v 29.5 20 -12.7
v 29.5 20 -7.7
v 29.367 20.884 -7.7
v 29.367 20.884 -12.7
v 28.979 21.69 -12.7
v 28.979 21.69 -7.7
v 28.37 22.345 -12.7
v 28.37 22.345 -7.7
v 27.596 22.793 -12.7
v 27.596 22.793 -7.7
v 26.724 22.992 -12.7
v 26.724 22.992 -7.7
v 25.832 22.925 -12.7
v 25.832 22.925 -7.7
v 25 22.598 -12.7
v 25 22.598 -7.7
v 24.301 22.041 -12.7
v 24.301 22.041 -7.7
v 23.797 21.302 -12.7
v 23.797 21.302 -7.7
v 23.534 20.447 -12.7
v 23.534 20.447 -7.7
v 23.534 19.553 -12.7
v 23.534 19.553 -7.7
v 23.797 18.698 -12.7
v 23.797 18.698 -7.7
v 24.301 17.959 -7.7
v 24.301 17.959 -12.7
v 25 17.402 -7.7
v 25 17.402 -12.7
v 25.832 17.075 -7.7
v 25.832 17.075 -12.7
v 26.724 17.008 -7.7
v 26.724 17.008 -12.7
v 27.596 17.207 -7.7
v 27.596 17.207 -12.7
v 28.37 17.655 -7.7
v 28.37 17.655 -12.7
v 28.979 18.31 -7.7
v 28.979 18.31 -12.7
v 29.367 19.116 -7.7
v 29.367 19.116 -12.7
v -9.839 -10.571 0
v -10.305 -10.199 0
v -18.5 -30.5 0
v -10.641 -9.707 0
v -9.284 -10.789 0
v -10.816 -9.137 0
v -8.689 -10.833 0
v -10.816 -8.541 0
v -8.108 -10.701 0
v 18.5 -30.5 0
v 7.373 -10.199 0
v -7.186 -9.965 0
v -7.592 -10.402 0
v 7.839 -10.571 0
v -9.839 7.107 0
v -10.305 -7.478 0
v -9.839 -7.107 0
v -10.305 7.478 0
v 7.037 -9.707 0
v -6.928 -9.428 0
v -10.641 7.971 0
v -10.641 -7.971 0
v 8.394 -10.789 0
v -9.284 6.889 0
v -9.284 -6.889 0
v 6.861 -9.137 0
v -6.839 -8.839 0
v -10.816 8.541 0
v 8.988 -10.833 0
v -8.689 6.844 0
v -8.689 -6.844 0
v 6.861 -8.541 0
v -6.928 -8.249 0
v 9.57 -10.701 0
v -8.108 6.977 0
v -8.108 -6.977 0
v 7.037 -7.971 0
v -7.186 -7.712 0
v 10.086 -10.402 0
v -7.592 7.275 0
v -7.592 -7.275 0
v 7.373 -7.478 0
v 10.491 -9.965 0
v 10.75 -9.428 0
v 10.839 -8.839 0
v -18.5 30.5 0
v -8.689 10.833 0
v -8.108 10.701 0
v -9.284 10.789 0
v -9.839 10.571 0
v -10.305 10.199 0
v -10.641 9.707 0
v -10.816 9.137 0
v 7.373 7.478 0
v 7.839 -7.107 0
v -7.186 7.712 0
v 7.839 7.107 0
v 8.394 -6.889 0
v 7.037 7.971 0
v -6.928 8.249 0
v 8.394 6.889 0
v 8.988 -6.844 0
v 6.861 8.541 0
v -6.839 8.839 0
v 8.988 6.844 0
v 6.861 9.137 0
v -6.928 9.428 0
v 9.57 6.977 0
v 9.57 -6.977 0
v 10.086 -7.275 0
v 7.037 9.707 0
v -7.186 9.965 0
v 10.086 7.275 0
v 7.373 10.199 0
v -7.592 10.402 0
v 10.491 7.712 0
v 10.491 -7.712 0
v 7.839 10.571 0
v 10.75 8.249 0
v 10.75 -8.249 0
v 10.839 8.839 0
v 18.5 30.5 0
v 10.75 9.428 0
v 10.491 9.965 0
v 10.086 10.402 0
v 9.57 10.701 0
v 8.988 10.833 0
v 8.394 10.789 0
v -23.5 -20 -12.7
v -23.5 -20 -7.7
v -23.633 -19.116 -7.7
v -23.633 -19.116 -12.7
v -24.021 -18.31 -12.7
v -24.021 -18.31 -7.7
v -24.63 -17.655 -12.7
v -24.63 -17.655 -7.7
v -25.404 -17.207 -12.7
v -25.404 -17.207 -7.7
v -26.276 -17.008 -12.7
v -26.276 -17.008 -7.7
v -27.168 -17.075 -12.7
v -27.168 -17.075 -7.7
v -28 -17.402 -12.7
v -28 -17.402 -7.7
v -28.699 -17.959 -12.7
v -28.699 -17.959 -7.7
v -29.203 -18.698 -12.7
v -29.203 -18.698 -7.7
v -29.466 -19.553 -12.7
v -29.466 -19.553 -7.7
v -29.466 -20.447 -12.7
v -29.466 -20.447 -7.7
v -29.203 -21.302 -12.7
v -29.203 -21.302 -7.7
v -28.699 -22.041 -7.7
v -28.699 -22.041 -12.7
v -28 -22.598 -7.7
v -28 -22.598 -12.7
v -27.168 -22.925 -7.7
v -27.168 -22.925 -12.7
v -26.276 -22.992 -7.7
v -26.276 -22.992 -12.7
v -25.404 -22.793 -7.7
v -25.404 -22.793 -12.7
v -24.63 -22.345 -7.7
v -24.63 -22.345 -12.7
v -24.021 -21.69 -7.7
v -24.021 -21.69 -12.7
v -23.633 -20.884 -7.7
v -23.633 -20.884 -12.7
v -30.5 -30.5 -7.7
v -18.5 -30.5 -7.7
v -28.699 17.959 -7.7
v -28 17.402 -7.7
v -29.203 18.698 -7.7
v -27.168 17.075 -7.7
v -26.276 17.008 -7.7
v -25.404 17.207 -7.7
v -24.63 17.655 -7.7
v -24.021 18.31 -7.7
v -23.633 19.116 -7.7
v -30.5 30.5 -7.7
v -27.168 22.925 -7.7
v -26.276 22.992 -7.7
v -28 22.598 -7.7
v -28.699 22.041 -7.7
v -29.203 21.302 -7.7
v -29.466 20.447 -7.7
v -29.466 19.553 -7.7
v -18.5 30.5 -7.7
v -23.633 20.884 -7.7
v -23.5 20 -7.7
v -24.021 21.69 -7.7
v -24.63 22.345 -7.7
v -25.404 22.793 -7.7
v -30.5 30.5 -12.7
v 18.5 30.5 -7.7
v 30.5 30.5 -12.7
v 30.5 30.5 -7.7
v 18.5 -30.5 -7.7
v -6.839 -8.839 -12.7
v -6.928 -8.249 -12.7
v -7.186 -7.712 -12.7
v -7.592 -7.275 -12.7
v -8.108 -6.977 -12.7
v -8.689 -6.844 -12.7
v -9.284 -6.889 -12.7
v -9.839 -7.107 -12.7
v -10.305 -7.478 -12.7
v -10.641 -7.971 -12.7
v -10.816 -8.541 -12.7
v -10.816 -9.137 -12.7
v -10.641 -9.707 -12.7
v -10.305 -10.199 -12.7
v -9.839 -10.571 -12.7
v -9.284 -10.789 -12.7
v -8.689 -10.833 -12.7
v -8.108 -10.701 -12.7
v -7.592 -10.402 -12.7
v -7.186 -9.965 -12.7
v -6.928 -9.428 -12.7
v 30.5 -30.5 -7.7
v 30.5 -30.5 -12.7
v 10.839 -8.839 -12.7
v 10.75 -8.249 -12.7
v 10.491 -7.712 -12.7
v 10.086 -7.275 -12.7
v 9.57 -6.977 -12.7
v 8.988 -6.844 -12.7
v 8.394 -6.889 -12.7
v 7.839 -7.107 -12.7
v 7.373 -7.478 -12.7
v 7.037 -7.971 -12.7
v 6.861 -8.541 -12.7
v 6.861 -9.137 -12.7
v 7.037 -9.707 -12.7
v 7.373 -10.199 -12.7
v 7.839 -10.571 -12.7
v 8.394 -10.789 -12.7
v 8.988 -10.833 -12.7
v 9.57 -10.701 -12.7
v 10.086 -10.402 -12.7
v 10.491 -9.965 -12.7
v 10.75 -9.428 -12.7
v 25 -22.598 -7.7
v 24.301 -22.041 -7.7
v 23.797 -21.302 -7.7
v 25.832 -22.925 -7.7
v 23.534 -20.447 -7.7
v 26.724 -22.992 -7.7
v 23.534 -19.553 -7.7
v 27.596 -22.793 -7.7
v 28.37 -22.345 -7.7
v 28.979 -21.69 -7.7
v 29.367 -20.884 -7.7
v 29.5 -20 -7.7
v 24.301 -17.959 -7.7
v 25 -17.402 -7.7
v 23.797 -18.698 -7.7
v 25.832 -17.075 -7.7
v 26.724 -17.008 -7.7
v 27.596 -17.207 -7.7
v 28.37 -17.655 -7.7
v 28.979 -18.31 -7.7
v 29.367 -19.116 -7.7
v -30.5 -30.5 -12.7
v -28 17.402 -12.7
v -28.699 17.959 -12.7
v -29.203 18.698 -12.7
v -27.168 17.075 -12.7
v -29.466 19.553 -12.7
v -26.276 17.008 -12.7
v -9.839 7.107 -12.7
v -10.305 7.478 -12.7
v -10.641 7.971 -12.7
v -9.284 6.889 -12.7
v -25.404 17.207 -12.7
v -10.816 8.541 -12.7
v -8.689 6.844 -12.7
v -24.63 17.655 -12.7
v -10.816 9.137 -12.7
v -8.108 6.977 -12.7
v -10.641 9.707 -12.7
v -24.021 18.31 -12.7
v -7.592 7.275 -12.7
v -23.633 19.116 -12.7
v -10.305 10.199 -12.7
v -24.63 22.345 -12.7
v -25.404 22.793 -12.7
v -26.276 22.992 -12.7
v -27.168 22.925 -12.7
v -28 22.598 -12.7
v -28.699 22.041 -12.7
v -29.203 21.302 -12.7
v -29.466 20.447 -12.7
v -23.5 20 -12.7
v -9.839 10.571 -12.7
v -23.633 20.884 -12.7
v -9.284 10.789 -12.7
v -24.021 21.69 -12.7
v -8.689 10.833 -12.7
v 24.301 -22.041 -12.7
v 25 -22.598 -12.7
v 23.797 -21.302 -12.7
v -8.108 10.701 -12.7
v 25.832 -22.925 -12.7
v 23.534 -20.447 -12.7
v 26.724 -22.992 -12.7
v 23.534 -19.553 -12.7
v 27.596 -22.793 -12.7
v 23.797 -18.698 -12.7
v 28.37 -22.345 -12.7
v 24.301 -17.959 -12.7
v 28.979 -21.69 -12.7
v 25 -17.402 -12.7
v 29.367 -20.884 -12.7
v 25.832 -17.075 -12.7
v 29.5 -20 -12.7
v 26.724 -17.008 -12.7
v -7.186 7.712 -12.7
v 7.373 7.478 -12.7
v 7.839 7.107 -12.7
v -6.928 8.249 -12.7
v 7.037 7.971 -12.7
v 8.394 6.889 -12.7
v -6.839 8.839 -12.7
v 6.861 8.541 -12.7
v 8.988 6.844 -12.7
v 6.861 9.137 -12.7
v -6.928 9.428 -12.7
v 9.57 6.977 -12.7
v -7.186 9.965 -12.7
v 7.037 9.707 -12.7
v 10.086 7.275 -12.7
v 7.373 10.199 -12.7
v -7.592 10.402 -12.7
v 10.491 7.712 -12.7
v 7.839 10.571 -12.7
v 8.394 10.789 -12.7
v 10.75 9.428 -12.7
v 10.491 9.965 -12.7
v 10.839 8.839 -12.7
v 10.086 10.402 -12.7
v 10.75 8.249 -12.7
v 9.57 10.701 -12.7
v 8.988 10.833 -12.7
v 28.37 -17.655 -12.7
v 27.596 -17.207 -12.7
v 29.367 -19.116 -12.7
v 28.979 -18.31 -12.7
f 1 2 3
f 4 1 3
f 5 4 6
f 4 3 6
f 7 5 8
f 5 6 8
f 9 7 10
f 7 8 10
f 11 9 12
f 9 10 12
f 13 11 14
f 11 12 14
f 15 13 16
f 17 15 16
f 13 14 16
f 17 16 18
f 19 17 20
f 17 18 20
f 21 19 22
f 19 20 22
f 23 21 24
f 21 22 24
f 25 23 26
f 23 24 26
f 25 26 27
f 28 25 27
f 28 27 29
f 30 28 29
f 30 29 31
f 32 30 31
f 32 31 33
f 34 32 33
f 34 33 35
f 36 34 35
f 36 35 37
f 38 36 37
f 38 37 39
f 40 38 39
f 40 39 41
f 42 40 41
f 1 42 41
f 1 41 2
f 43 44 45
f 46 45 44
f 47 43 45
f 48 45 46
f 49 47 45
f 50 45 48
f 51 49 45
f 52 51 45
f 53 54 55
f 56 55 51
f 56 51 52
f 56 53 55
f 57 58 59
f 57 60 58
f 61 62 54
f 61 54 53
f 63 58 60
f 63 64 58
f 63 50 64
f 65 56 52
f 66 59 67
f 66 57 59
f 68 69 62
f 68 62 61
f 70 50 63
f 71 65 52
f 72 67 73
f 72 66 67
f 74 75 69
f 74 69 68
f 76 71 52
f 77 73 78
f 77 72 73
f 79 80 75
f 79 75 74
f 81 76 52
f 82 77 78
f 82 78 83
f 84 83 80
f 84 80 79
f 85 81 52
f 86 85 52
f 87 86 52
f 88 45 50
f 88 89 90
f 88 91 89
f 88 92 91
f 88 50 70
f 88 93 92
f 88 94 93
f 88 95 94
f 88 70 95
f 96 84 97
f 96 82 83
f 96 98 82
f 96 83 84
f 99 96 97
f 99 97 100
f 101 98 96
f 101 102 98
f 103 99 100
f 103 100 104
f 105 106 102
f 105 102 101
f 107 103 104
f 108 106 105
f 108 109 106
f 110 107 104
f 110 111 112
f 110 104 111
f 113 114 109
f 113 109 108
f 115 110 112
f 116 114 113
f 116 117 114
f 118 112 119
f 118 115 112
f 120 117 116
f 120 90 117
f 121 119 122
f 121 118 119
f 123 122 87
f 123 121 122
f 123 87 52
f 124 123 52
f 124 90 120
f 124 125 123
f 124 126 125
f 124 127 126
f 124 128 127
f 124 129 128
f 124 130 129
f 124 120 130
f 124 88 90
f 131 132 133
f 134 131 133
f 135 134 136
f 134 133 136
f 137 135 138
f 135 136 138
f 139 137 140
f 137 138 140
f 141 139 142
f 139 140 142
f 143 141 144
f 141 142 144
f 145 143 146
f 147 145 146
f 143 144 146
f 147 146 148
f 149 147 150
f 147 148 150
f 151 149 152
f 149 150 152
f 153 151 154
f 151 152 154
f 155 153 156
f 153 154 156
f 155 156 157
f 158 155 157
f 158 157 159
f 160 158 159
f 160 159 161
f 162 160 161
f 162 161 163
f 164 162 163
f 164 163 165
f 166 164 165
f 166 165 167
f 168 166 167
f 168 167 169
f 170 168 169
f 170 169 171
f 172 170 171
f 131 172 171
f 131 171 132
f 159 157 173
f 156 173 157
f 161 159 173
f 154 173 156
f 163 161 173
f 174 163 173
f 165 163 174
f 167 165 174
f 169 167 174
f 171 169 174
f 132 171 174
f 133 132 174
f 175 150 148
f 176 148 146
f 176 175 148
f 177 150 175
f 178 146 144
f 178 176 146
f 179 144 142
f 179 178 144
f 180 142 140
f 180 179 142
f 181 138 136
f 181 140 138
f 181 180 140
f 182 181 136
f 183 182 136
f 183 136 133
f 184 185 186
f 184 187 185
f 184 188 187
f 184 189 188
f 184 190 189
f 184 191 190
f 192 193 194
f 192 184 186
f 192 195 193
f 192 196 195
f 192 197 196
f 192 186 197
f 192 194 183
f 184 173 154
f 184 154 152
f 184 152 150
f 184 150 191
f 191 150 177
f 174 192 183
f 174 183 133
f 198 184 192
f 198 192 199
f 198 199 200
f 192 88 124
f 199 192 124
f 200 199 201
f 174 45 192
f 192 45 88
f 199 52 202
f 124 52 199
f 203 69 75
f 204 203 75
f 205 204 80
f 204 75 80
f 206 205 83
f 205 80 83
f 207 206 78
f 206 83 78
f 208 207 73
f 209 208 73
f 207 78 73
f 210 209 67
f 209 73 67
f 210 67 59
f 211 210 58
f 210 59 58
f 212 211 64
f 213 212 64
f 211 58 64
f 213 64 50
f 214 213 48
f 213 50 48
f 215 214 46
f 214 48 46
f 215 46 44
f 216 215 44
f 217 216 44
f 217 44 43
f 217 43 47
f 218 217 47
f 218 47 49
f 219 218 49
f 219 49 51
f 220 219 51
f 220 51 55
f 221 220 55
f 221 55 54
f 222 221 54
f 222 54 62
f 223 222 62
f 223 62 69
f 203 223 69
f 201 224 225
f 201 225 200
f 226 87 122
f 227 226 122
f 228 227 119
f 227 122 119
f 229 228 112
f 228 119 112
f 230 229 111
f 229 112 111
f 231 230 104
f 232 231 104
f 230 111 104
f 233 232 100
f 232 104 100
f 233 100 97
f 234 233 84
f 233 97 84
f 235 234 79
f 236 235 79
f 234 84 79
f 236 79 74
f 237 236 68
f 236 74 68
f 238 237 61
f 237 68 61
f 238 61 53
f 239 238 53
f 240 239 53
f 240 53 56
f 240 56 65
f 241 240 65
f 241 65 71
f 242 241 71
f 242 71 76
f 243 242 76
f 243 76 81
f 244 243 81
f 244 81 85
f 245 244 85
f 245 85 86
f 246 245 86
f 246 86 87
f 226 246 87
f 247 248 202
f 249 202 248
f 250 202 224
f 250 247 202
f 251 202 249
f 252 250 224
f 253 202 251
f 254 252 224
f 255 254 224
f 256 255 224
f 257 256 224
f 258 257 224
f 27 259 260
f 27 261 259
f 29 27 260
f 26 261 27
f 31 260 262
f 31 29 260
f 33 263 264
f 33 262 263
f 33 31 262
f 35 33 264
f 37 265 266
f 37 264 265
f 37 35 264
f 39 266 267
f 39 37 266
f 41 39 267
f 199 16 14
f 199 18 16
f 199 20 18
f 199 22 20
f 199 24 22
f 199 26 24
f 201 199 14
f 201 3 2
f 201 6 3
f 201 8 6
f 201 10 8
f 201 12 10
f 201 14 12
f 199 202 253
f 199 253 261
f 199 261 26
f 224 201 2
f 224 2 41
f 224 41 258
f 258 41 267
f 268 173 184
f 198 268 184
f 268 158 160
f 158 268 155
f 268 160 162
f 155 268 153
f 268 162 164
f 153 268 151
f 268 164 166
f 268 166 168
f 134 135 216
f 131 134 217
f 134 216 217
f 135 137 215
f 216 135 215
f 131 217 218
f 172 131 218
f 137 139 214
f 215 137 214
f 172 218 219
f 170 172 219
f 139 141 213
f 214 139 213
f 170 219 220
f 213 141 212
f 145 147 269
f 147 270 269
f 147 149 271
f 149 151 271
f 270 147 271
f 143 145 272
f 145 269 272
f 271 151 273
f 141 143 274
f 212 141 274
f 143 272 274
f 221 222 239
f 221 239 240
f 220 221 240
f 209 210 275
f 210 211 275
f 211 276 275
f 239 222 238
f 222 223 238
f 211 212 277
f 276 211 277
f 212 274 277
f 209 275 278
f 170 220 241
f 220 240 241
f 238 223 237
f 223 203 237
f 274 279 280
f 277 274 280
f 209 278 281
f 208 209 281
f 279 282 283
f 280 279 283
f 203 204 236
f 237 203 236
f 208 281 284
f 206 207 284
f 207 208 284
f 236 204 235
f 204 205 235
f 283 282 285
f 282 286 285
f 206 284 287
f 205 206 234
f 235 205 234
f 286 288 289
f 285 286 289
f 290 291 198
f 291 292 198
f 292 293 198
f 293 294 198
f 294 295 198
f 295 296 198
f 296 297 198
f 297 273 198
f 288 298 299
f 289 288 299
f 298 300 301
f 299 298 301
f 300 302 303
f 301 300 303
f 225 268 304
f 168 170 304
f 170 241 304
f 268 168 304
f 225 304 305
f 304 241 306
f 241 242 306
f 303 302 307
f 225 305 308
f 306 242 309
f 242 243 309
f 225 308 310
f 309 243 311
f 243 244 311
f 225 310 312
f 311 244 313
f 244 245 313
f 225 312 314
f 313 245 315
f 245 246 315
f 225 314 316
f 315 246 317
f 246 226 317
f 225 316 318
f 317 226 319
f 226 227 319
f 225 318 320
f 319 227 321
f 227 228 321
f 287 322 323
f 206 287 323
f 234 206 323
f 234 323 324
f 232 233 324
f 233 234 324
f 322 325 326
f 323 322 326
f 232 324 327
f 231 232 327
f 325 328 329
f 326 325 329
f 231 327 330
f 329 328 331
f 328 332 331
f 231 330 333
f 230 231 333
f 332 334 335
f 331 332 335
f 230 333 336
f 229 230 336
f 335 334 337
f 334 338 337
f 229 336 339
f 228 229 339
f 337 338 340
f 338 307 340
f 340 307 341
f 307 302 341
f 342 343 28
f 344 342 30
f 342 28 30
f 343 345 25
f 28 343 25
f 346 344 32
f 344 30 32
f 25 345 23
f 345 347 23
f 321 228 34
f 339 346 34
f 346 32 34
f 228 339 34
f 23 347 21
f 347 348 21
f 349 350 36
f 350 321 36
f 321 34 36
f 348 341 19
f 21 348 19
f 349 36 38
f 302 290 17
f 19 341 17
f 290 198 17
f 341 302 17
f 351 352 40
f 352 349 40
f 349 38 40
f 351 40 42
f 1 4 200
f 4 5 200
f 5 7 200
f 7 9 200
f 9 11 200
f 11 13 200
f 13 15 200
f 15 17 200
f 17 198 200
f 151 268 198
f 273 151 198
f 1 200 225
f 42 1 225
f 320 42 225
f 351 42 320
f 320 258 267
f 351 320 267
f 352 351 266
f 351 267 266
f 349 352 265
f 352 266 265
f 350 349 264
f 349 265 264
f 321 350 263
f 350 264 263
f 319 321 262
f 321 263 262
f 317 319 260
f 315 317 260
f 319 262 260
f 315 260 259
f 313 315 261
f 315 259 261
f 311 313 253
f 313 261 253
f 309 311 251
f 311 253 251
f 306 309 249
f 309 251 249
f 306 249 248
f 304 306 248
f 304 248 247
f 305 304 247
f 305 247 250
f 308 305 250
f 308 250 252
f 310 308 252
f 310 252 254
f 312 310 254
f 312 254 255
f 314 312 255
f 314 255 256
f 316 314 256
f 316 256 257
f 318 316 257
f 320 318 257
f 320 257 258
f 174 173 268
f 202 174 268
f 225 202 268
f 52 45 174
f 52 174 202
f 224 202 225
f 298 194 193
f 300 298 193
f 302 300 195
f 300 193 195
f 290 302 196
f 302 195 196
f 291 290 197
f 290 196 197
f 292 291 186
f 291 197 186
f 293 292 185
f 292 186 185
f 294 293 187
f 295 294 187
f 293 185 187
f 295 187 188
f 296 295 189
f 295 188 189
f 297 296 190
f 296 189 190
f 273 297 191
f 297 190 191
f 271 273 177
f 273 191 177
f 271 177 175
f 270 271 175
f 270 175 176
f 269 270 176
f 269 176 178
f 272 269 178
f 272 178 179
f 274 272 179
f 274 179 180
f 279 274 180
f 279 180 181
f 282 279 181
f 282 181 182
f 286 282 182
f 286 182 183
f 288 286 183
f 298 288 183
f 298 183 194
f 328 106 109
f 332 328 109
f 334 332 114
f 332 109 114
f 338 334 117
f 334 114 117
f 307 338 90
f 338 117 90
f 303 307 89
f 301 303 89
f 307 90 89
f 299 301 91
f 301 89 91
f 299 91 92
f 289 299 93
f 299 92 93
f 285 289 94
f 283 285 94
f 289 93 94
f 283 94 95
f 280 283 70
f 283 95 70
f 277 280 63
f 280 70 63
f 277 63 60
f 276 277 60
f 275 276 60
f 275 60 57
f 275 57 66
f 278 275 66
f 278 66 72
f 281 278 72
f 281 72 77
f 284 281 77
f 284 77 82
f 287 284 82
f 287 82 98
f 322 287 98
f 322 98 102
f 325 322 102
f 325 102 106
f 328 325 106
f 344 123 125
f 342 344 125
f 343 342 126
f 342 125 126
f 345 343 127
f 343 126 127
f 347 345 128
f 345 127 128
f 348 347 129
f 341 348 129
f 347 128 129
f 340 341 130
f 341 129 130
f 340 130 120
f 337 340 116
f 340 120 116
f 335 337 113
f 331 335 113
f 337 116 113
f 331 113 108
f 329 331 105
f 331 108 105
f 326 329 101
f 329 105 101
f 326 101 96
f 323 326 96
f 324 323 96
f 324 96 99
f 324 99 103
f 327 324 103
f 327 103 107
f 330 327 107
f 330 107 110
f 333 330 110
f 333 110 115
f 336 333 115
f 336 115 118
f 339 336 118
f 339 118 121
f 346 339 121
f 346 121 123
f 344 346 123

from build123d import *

# Parameters (mm, degrees)
SKETCH1_W           = 61
SKETCH1_H           = 61
BOSS_EXTRUDE1_DEPTH = 12.7
SKETCH2_R           = 2
CUT_EXTRUDE1_DEPTH  = 45.964319188
SKETCH3_R           = 3
CUT_EXTRUDE2_DEPTH  = 45.964319188
SKETCH4_W           = 12
SKETCH4_H           = 61
CUT_EXTRUDE3_DEPTH  = 7.7


with BuildPart() as part:
    # Sketch1 → Boss-Extrude1 (new body)
    with BuildSketch(Plane.XY):
        Rectangle(SKETCH1_W, SKETCH1_H)
    extrude(amount=-BOSS_EXTRUDE1_DEPTH)

    # Sketch2 → Cut-Extrude1 (cut, through all)
    with BuildSketch(Plane.XY):
        with Locations((8.838834765, 8.838834765)):
            Circle(SKETCH2_R)
        with Locations((-8.838834765, 8.838834765)):
            Circle(SKETCH2_R)
        with Locations((-8.838834765, -8.838834765)):
            Circle(SKETCH2_R)
        with Locations((8.838834765, -8.838834765)):
            Circle(SKETCH2_R)
    extrude(amount=-CUT_EXTRUDE1_DEPTH, mode=Mode.SUBTRACT)

    # Sketch3 → Cut-Extrude2 (cut, through all)
    with BuildSketch(Plane.XY):
        with Locations((26.5, 20)):
            Circle(SKETCH3_R)
        with Locations((26.5, -20)):
            Circle(SKETCH3_R)
        with Locations((-26.5, 20)):
            Circle(SKETCH3_R)
        with Locations((-26.5, -20)):
            Circle(SKETCH3_R)
    extrude(amount=-CUT_EXTRUDE2_DEPTH, mode=Mode.SUBTRACT)

    # Sketch4 → Cut-Extrude3 (cut)
    with BuildSketch(Plane.XY):
        with Locations((-24.5, 0)):
            Rectangle(SKETCH4_W, SKETCH4_H)
        with Locations((24.5, 0)):
            Rectangle(SKETCH4_W, SKETCH4_H)
    extrude(amount=-CUT_EXTRUDE3_DEPTH, mode=Mode.SUBTRACT)


solid = part.part
